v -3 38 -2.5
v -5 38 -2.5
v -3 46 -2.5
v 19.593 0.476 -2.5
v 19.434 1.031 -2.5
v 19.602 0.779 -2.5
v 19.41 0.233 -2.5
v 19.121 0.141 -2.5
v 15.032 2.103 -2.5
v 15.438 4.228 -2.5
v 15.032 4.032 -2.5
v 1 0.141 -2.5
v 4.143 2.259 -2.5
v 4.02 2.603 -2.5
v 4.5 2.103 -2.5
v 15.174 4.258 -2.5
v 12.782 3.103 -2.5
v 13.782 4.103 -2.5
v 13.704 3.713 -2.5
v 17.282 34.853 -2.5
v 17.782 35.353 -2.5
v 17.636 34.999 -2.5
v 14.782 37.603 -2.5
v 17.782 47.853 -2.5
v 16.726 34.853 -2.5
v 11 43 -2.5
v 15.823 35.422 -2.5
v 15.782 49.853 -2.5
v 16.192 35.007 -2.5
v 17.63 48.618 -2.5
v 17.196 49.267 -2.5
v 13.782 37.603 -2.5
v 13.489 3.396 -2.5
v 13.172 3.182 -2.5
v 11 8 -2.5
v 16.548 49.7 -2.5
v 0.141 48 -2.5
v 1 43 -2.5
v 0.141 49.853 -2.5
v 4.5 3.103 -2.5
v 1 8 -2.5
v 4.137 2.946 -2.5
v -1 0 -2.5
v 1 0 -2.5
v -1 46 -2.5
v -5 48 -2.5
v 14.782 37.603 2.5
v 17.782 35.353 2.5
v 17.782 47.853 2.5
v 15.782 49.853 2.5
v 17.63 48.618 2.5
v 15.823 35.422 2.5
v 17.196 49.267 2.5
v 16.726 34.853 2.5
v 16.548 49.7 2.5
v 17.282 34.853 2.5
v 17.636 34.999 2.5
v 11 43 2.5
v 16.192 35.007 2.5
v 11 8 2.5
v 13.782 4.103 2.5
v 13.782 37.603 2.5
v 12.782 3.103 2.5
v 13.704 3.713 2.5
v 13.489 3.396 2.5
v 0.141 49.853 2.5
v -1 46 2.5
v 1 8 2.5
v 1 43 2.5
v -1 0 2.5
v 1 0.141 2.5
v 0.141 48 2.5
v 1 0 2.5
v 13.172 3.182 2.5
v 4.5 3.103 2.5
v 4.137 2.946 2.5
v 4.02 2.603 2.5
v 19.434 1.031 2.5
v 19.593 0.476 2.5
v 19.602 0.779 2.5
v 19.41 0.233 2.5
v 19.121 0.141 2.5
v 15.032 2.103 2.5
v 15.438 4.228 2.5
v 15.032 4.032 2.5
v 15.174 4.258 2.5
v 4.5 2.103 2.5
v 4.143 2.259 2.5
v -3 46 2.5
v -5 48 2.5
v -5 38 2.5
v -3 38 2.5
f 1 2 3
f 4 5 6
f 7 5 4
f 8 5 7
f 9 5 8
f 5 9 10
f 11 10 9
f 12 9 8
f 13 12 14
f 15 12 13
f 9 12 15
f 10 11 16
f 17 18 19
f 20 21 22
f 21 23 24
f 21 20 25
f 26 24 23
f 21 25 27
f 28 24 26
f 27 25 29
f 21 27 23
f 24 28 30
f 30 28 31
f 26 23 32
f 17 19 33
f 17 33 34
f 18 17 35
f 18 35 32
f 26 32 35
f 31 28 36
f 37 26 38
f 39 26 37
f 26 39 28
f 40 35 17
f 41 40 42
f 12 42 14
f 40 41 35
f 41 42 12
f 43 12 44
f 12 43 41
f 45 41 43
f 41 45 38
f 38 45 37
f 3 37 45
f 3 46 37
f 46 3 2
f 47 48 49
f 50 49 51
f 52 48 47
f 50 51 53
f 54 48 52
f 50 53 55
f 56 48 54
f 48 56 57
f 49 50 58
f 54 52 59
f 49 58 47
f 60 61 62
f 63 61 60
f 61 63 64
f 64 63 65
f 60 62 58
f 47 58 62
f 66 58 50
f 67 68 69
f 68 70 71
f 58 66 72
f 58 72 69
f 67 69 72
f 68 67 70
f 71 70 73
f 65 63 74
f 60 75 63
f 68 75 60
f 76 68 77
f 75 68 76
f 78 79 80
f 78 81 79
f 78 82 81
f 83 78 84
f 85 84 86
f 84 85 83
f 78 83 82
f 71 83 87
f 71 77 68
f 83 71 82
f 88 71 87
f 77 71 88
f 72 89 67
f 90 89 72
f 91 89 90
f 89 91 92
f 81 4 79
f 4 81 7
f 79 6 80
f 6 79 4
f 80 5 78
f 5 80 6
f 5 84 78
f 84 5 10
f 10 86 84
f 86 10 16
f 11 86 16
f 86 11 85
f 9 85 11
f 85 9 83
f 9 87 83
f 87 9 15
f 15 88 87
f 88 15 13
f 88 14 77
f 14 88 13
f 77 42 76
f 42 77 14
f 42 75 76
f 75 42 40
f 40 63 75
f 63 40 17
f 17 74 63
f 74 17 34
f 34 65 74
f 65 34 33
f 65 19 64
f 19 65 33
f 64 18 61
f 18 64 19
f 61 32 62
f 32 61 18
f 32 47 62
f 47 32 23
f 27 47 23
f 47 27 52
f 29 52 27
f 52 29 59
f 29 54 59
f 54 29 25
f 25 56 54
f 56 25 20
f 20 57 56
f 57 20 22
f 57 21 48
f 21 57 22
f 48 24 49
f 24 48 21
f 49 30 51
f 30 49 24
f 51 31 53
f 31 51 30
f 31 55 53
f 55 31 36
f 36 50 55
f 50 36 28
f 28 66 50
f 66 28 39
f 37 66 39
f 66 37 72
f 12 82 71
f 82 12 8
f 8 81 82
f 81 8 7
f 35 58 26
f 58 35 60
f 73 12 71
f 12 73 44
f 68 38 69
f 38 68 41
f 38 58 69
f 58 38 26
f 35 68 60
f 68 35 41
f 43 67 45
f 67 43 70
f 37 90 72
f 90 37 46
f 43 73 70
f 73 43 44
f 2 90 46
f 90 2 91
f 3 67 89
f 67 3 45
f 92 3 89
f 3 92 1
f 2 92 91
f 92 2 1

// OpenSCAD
CLIP_H = 5;
HOLE_DEPTH = 9;
HOLE_DIAMETER = 2.1;
HEIGHT = 2;
EMPTYLength = 35;
EMPTYWidth = 10;

module din_clip() {
	
    union() {
        difference() {
            linear_extrude(height=CLIP_H, center=true, convexity=5) {
                import(file="din_clip_01.dxf", layer="0", $fn=64);
            }
            
            translate([6, (EMPTYLength / 2) + 8 , 0]) {
                cube([ EMPTYWidth,  EMPTYLength, CLIP_H], center = true);
            }
        }
        
        translate([0, 24, 0]) {
            difference() {
                union() {
                    cube([HEIGHT, 48, CLIP_H], center = true);
                    
                    translate([-HEIGHT, 23, 0]) cube([HEIGHT + 4, 2, CLIP_H], center = true);
                    translate([0, 17, 0]) cube([HEIGHT, 10, CLIP_H], center = true);                    
                    translate([-HEIGHT - 2, 19, 0]) cube([HEIGHT, 10, CLIP_H], center = true);
                }
                /*union() {

                    translate([-HEIGHT, 38, 0]) {
                        rotate([0, 90, 0]) {
                            cylinder(h= HOLE_DEPTH, r = HOLE_DIAMETER / 2, $fn = 16);
                        }
                    }

                    translate([-HEIGHT, -38, 0]) {
                        rotate([0, 90, 0]) {
                            cylinder(h= HOLE_DEPTH, r = HOLE_DIAMETER / 2, $fn = 16);
                        }
                    }
                }*/
            }
        }
    }
}

din_clip();
